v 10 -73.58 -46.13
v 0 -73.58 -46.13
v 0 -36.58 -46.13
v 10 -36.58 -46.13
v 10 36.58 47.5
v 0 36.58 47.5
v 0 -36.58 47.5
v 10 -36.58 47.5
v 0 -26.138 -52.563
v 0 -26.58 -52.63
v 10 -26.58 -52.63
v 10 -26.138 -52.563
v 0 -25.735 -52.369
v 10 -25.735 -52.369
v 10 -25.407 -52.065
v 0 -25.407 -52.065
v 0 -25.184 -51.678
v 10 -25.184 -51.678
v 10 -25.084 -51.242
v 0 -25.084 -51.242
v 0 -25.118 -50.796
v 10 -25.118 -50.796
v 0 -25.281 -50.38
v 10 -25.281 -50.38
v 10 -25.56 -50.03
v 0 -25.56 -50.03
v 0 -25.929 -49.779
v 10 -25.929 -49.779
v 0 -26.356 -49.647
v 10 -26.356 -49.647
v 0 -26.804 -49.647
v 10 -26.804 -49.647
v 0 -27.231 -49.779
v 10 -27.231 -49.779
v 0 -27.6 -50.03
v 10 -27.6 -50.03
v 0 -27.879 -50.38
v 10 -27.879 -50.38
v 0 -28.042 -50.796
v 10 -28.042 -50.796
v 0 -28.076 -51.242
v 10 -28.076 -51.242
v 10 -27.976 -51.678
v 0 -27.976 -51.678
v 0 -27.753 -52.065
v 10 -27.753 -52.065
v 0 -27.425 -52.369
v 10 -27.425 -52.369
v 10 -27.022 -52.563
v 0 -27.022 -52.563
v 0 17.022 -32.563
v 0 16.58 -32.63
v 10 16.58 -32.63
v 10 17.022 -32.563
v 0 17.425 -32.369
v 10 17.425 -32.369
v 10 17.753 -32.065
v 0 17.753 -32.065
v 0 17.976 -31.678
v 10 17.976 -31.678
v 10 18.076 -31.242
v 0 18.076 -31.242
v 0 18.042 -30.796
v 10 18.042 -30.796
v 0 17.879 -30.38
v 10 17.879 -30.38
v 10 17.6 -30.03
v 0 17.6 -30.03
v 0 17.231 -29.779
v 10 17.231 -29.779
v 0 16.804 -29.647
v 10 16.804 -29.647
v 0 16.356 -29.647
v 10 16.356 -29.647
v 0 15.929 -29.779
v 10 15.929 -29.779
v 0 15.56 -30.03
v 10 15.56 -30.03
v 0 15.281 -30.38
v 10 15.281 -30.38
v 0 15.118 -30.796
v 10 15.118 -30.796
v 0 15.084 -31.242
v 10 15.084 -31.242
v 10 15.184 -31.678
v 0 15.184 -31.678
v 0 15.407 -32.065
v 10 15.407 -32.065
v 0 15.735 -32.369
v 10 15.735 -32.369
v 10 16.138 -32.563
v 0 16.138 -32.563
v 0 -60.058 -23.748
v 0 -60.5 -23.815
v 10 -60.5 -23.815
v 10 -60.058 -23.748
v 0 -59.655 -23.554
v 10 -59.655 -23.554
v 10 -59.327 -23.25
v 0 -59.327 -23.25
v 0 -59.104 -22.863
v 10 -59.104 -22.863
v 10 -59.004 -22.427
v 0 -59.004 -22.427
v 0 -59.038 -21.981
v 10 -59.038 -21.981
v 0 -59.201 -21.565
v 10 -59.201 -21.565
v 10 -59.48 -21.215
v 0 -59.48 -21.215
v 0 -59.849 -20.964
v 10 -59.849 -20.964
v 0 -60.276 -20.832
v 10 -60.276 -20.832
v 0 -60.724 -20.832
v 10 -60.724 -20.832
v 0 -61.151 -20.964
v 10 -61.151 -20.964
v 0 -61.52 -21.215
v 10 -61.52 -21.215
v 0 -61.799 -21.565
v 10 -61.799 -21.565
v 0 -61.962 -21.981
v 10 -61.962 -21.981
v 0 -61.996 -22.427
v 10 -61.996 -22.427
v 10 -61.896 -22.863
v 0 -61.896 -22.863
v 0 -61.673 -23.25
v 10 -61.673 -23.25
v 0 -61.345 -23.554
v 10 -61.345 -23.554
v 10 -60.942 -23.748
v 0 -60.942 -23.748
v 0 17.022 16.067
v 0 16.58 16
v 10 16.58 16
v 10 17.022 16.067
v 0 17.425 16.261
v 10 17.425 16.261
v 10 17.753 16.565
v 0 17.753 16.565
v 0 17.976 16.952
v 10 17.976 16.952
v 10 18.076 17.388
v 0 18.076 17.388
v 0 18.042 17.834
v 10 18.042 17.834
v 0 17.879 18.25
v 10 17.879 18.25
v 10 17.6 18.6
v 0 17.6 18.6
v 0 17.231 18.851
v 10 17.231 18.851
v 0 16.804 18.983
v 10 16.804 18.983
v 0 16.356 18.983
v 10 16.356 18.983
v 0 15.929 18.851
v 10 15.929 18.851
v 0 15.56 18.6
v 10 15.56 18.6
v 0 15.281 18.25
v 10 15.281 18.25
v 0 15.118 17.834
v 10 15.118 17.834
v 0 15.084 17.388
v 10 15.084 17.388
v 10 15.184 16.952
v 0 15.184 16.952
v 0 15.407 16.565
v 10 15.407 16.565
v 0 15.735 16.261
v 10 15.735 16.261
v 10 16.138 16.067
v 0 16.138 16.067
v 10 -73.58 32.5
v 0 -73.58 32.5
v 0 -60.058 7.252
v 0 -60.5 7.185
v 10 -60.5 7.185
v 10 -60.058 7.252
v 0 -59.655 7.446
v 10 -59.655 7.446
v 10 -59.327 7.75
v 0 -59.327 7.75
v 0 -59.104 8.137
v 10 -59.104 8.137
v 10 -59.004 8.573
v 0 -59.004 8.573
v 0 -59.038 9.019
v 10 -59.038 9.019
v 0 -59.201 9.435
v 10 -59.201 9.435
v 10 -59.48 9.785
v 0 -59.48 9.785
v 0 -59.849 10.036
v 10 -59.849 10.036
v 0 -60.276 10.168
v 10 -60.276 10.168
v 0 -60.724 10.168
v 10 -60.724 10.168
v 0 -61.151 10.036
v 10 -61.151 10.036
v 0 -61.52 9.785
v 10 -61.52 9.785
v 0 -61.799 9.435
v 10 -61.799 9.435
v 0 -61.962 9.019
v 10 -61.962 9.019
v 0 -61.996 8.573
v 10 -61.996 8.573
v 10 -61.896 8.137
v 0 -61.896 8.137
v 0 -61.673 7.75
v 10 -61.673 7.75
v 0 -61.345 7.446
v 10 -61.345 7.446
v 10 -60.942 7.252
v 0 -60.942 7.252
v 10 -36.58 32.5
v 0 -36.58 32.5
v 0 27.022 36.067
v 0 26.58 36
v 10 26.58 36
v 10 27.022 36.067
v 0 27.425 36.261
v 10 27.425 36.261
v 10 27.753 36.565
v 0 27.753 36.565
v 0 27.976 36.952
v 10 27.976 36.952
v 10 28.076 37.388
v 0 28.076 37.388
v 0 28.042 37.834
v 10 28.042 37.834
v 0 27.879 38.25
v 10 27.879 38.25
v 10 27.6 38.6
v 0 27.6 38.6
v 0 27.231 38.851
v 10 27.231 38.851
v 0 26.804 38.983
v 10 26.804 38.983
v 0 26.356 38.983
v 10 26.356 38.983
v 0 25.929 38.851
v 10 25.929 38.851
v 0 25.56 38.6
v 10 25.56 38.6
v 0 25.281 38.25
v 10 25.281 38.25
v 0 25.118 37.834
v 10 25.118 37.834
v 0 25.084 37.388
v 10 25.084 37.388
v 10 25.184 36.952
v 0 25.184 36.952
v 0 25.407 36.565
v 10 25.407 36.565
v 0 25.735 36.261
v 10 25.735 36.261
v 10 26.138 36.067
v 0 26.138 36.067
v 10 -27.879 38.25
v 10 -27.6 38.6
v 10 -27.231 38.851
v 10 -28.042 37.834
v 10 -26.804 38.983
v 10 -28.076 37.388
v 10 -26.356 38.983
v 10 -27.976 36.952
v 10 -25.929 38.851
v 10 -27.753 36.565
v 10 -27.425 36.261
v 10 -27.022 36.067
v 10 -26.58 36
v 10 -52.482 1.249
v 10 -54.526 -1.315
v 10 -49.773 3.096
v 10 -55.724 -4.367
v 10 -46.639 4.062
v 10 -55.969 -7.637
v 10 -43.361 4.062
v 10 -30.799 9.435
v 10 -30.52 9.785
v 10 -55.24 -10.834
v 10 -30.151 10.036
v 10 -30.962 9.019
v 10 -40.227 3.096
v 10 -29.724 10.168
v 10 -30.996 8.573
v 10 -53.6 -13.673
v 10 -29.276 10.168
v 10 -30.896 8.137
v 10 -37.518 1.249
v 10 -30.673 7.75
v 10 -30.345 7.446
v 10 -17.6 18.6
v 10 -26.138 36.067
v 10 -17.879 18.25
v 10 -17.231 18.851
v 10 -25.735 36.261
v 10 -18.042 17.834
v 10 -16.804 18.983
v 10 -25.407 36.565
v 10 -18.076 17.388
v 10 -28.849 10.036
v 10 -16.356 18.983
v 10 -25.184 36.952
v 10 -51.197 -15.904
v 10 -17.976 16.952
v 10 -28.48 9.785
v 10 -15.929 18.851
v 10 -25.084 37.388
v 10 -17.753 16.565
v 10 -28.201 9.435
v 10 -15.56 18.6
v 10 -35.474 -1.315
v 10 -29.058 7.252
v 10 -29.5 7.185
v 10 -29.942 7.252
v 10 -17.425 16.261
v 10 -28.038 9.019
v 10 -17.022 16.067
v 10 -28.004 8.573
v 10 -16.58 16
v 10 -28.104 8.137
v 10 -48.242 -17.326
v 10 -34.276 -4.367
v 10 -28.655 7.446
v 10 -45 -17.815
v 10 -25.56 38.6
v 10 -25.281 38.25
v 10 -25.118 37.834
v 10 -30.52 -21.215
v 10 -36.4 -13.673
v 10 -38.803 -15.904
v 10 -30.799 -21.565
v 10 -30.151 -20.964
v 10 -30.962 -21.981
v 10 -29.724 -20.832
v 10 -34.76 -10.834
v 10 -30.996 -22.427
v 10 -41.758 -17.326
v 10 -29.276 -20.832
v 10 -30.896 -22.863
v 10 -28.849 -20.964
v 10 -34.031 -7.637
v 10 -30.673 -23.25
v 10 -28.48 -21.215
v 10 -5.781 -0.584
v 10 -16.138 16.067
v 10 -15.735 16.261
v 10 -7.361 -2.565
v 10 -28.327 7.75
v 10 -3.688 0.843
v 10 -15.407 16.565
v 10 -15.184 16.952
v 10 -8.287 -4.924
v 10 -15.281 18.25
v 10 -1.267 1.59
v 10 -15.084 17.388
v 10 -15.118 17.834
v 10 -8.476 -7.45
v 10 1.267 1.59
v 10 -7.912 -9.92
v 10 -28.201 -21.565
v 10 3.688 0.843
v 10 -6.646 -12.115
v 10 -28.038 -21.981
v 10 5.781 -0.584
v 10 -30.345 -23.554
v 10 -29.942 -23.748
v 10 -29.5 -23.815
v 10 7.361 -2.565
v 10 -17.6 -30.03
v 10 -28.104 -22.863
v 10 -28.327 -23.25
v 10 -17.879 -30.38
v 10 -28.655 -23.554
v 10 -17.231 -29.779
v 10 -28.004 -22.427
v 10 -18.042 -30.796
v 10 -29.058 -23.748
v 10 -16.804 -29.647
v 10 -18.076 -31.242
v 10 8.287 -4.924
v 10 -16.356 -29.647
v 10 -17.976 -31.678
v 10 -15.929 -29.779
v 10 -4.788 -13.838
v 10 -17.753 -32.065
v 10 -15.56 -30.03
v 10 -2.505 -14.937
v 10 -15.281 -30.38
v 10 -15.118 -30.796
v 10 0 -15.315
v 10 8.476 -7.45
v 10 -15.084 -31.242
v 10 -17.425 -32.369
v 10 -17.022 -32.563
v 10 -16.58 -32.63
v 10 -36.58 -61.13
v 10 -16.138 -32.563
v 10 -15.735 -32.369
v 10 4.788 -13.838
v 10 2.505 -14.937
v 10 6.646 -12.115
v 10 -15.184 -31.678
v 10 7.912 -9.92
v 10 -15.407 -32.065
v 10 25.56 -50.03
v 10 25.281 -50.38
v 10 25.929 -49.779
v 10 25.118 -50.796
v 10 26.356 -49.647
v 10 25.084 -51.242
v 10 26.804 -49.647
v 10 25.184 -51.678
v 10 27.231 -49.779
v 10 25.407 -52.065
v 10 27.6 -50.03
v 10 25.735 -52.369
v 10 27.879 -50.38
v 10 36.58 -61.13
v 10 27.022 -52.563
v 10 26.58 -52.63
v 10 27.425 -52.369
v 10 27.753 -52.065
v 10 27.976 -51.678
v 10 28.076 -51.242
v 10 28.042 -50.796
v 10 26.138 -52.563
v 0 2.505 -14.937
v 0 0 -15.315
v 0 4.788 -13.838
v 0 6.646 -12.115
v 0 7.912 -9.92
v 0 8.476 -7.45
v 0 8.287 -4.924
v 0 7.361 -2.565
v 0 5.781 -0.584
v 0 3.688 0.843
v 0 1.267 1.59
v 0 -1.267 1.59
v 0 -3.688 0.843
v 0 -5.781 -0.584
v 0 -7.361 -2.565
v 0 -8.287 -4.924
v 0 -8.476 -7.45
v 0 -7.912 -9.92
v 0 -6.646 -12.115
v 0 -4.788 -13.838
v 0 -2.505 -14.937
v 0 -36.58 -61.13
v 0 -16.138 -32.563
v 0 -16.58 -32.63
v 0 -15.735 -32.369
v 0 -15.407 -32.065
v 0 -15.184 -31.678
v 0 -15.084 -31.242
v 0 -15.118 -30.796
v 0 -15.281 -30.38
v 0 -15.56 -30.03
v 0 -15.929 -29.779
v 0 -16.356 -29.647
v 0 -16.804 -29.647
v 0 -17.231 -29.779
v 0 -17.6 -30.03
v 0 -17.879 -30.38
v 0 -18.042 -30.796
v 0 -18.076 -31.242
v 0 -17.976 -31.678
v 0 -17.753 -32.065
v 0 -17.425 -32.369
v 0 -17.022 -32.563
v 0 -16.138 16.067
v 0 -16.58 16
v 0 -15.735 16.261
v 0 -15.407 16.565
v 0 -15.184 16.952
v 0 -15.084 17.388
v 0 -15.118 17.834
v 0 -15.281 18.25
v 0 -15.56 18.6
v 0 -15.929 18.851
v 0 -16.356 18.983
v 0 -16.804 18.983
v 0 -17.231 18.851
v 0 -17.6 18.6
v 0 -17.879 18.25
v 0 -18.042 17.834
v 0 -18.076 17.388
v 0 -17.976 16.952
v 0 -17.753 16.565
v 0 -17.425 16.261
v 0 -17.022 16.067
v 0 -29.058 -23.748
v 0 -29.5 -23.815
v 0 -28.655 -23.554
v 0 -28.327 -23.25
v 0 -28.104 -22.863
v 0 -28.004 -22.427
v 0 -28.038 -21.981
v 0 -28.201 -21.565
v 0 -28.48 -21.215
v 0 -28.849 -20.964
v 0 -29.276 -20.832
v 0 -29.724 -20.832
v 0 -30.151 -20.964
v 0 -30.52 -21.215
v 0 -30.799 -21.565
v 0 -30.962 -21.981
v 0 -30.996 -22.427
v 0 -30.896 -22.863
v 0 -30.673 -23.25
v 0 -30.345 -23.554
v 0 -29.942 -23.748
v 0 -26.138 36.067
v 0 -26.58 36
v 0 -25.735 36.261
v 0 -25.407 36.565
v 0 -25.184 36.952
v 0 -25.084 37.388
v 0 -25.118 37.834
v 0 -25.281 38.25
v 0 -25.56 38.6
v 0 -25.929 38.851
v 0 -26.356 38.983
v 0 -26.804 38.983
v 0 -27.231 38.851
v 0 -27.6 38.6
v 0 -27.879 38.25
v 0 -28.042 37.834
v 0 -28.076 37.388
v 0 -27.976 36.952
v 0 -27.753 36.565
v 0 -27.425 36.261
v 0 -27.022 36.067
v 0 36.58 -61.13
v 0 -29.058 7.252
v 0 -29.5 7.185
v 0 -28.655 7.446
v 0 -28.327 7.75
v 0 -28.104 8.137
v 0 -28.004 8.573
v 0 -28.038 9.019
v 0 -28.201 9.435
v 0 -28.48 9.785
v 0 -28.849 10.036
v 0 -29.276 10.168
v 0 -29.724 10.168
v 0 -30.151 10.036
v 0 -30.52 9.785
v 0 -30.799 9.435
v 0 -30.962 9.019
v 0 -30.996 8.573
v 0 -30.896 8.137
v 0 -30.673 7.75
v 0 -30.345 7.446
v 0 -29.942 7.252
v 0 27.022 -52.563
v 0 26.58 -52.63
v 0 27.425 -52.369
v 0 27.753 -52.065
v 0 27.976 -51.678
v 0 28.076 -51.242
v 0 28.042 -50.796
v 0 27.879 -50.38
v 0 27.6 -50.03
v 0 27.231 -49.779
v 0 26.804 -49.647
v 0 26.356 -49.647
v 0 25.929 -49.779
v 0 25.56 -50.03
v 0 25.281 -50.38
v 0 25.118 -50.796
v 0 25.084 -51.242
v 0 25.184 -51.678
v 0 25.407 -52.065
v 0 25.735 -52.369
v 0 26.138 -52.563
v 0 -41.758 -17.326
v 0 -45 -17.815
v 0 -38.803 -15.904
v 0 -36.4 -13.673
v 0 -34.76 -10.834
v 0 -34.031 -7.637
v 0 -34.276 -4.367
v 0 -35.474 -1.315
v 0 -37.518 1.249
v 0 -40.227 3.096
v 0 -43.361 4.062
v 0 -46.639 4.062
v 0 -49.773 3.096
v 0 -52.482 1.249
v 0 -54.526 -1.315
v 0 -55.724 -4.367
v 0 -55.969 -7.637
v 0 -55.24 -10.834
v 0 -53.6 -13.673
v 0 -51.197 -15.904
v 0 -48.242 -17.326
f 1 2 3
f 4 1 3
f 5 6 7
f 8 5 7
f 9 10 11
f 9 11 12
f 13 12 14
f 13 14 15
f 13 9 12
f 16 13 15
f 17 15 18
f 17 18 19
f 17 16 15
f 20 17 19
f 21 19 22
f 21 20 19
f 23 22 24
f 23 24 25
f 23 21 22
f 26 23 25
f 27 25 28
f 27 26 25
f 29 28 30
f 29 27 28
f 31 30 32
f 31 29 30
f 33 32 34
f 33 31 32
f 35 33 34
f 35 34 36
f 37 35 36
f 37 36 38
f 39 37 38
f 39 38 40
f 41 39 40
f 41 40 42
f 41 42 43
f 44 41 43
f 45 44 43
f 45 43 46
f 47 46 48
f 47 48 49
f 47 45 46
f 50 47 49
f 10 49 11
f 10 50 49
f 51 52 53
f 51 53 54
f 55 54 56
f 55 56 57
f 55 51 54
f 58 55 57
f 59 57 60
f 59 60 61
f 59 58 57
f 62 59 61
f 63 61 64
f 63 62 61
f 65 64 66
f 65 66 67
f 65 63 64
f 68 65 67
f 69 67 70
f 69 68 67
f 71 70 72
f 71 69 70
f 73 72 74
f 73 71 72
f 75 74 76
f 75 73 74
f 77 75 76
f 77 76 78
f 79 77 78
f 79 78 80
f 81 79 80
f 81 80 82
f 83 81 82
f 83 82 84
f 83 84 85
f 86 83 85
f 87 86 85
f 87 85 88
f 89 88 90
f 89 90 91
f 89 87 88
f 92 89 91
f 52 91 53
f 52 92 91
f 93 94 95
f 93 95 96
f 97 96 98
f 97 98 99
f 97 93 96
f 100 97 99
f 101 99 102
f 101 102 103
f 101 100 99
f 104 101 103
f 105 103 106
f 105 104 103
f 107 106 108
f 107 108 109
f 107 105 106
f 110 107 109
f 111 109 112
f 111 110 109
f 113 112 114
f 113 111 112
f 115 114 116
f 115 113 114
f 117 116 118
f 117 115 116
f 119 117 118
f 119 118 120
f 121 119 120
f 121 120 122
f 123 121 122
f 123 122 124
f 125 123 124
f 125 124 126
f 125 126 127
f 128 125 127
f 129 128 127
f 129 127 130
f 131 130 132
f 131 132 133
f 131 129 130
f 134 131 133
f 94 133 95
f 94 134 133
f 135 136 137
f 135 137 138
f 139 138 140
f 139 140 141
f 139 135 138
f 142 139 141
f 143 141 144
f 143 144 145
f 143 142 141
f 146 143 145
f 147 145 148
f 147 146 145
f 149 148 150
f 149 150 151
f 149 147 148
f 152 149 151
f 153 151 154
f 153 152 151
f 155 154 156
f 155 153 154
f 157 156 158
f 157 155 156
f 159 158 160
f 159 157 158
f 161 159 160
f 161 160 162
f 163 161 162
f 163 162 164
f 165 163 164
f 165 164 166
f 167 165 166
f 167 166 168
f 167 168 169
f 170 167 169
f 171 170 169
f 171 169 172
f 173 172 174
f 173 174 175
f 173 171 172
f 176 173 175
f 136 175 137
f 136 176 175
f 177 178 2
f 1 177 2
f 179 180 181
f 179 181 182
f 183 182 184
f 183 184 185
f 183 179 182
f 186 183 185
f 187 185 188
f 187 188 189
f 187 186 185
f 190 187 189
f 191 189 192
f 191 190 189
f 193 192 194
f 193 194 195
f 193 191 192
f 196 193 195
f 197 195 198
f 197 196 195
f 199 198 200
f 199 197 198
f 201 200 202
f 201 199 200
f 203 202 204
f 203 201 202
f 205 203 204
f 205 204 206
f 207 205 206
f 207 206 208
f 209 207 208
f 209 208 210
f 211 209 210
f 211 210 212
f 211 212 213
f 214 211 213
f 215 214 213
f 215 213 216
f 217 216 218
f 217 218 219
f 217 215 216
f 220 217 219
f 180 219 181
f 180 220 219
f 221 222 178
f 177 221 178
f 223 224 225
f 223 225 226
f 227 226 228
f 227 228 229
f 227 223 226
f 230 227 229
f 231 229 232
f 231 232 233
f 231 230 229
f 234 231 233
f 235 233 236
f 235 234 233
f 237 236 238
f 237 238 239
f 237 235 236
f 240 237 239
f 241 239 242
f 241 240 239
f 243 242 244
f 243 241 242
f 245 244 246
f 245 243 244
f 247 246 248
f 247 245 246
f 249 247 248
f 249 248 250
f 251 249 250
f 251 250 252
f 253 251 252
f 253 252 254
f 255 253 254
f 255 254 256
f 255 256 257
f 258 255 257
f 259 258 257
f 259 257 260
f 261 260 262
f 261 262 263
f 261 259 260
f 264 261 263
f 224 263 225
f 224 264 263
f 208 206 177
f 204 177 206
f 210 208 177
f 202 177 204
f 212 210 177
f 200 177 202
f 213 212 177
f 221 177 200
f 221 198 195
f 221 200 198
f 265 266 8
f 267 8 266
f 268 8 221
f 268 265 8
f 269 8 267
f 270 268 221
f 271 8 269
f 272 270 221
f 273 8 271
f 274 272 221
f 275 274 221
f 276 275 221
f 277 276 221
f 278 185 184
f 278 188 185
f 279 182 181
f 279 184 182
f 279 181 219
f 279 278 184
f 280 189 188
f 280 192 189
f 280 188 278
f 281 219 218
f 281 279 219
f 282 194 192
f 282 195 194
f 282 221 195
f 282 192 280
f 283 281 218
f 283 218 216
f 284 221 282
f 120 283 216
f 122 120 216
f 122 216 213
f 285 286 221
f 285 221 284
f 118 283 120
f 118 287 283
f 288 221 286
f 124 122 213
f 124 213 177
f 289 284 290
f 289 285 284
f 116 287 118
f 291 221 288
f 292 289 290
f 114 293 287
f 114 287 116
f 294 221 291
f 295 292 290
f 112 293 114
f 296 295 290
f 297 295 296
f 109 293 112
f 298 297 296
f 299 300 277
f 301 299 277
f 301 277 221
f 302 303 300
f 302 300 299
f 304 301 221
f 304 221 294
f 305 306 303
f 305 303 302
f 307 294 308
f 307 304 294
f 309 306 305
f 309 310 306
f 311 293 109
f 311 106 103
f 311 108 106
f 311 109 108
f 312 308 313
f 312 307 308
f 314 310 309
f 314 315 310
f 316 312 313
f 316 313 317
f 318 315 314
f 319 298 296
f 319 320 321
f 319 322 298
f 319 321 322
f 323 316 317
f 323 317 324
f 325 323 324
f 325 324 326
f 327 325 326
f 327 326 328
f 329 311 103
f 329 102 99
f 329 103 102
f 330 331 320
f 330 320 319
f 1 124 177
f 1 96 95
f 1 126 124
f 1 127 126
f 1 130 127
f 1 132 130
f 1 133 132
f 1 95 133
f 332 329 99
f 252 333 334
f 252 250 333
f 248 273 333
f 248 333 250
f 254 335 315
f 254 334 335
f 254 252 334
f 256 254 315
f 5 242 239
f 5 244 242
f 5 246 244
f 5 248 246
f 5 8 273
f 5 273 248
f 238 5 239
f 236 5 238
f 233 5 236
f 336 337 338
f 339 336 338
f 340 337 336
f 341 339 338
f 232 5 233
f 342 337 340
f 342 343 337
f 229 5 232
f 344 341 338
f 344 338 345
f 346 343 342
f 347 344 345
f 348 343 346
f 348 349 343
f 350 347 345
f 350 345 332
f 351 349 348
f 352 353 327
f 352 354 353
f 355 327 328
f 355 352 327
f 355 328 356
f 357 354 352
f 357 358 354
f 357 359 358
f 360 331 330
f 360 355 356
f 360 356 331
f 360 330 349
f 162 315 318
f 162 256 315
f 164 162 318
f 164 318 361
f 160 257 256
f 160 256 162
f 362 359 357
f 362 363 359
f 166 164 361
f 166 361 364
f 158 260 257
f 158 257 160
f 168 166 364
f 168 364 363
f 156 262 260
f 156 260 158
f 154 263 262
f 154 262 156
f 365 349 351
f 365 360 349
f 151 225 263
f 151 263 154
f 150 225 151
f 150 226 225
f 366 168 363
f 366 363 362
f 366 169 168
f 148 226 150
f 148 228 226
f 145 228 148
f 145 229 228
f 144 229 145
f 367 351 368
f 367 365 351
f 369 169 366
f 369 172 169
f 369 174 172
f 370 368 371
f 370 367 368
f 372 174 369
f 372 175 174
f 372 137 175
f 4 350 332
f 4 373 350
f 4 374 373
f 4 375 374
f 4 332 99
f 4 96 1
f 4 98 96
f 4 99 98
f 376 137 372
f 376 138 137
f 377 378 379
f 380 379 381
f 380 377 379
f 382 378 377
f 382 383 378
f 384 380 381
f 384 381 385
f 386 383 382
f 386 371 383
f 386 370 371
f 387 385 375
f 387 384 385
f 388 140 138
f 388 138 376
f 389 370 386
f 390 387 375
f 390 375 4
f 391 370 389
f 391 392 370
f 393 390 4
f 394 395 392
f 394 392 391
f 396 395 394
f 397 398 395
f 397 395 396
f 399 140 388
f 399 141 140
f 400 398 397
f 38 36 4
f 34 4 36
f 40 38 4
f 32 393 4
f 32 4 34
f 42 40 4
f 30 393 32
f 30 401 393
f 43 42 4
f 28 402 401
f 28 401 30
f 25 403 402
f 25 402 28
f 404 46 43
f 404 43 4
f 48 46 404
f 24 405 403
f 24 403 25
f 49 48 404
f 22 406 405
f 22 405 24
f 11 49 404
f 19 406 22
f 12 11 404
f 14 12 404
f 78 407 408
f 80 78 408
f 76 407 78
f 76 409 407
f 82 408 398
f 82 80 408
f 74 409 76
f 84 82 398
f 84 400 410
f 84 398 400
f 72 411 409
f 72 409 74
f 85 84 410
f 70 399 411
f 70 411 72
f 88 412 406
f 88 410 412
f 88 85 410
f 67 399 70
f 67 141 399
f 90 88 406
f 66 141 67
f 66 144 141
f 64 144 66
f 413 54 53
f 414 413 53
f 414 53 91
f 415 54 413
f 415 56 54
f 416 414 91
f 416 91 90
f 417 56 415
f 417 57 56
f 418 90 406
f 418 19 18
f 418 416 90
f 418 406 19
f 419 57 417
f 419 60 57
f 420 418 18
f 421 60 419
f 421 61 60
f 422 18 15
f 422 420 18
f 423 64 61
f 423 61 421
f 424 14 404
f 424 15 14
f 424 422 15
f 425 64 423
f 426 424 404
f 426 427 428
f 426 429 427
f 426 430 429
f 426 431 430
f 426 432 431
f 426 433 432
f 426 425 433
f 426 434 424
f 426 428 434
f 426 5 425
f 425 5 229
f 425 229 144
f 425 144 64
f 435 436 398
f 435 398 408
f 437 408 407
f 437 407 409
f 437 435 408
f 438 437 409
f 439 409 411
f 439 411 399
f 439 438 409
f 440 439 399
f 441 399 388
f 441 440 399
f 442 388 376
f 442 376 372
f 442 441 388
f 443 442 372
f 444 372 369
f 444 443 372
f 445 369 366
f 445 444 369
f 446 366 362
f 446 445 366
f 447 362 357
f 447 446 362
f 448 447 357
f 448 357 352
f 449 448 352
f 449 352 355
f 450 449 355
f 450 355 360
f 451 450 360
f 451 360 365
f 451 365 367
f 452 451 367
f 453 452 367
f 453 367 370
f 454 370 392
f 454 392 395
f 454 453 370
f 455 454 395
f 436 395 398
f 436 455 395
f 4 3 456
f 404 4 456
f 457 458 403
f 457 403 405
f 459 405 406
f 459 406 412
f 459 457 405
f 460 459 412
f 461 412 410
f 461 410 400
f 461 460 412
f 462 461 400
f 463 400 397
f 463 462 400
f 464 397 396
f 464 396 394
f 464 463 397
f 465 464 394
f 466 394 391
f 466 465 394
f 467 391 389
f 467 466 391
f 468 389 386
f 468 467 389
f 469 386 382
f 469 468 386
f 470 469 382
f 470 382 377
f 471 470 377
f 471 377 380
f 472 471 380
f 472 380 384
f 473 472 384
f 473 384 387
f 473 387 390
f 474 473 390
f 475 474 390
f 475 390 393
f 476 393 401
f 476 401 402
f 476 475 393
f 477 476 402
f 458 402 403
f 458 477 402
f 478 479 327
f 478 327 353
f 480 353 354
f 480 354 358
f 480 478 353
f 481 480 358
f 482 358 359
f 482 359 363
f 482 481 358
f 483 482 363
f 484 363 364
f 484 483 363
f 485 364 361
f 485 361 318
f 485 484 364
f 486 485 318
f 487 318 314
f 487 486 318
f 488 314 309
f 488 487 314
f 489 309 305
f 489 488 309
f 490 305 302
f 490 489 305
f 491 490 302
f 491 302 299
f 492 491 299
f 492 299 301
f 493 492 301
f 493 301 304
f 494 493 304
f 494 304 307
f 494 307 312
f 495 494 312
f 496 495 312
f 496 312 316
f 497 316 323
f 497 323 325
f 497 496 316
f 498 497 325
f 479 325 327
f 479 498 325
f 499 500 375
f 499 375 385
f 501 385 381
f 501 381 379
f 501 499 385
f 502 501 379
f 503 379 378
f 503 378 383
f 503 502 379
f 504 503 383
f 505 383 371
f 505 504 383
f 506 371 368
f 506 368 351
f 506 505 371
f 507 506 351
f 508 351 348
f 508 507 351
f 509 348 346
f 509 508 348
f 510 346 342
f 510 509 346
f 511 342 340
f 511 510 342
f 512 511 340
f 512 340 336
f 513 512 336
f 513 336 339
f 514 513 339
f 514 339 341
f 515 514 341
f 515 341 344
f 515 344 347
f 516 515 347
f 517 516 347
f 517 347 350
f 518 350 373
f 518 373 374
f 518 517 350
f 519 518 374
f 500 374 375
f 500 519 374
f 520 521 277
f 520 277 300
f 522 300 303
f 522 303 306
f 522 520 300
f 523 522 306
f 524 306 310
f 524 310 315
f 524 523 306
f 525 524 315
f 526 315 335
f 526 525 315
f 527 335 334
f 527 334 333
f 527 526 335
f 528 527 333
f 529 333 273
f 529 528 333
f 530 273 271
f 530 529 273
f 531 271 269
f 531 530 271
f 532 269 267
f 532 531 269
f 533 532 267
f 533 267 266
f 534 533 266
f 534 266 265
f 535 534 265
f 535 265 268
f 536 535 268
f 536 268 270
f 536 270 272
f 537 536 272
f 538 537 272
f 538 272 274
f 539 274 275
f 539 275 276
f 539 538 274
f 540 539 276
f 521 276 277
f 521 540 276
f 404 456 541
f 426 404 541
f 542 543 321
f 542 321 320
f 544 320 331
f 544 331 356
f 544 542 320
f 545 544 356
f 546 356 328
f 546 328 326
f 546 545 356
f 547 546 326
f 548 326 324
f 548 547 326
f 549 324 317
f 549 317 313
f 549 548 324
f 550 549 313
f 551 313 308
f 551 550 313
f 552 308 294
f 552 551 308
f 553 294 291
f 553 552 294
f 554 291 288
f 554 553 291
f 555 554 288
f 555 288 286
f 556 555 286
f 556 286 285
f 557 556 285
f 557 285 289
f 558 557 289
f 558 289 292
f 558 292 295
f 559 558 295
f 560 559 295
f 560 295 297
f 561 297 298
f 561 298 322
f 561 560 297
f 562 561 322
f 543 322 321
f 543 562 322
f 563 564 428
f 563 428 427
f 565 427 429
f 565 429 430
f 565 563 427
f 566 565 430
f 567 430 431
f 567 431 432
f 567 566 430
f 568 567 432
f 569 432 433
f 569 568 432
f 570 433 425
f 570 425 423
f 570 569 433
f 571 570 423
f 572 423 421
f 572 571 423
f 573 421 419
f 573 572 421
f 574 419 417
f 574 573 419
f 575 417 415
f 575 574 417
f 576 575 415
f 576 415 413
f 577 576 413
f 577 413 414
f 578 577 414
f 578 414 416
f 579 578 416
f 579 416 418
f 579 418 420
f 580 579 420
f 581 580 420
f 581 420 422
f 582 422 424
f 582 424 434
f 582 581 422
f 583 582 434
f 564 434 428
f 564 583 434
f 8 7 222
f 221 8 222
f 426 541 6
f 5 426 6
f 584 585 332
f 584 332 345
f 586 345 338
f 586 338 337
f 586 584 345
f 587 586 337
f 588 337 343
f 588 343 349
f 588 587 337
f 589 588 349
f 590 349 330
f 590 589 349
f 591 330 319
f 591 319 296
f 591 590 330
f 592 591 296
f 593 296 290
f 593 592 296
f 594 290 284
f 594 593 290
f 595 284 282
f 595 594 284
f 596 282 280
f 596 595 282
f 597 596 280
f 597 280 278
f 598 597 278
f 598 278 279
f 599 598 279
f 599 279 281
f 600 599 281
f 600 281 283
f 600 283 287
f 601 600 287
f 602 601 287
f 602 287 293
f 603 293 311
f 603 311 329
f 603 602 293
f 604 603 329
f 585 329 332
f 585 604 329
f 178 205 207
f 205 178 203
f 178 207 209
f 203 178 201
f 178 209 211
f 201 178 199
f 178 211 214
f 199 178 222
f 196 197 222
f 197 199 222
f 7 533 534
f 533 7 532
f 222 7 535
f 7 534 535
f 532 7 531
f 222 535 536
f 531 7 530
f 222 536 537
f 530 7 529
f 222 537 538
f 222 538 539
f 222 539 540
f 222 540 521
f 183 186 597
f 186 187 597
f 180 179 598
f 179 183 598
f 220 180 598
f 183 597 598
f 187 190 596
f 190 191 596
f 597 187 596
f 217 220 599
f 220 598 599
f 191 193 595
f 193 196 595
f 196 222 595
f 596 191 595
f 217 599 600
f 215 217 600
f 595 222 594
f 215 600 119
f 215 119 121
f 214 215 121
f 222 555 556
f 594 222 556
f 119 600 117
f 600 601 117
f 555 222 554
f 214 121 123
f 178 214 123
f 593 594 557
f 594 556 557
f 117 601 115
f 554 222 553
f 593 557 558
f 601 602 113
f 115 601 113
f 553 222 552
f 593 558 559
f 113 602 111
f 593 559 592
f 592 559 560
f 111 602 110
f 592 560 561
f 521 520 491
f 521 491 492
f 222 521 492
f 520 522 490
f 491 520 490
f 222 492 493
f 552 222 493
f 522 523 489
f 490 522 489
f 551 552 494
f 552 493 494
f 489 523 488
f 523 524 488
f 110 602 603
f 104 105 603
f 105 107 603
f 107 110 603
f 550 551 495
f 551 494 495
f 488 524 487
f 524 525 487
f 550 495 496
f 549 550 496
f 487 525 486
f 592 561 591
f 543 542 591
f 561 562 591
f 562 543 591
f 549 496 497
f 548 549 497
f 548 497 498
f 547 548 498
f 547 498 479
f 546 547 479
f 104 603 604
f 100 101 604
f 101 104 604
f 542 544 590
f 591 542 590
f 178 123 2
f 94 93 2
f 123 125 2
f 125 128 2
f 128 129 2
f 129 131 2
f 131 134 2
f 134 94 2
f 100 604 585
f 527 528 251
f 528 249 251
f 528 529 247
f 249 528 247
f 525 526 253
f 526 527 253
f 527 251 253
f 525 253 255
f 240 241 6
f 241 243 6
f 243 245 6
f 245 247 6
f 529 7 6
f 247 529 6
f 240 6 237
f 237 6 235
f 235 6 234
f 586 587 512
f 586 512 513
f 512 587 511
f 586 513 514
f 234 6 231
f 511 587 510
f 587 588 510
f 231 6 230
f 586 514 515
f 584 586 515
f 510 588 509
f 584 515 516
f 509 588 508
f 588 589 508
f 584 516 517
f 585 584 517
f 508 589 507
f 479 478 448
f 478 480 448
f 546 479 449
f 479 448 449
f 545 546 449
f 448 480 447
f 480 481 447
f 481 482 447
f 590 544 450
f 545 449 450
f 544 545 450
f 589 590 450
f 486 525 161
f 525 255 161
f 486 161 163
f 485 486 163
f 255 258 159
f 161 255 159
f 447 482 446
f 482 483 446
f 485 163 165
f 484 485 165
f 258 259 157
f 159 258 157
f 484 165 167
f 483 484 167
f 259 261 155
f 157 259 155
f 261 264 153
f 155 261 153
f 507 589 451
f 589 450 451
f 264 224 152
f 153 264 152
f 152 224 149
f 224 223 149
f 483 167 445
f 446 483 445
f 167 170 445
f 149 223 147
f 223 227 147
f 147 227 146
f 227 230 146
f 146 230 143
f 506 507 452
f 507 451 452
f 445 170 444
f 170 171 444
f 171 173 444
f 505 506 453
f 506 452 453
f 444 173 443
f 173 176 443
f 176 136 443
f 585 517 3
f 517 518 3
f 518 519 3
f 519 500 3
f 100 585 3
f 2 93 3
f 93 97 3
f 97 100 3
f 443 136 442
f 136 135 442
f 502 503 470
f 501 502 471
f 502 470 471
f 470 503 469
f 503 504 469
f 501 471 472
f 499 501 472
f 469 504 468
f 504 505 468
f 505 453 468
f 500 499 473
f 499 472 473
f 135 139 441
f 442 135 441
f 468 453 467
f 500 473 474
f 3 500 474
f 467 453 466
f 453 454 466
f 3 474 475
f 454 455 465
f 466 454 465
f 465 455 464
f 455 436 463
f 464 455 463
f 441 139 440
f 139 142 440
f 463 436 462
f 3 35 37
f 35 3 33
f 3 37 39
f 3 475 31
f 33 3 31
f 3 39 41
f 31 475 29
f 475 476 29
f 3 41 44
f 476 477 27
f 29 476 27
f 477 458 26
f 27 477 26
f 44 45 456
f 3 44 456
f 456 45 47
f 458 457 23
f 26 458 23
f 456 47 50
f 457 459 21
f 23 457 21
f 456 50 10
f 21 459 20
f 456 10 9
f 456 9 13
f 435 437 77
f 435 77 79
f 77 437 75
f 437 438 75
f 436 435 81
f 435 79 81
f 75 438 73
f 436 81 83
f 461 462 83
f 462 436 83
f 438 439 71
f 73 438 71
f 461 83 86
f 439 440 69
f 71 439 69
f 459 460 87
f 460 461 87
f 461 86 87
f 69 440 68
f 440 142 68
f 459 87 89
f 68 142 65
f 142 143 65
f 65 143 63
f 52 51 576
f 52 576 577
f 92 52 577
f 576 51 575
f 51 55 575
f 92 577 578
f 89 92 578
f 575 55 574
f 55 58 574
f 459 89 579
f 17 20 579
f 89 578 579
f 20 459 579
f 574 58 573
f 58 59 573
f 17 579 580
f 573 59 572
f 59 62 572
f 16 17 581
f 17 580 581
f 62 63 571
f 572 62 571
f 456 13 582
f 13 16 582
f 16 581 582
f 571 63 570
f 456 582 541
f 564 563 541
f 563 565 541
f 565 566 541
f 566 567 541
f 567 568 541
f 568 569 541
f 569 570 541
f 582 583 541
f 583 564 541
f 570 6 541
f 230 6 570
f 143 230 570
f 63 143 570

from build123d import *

# Parameters (mm, degrees)
SKETCH_1_R      = 1.5
SKETCH_1_R_2    = 8.5
SKETCH_1_R_3    = 11
EXTRUDE_1_DEPTH = 10


with BuildPart() as part:
    # 草图1 → 凸台-拉伸1 (new body)
    with BuildSketch(Plane(origin=(0, 0, 0), x_dir=(0, 0, -1), z_dir=(1, 0, 0))):
        Polygon((-27.5, 36.58), (-47.5, 36.58), (-47.5, -36.58), (-32.5, -36.58), (-32.5, -73.58), (46.13, -73.58), (46.13, -36.58), (61.13, -36.58), (61.13, 36.58), align=None)
        with Locations((-8.685, -29.5)):
            Circle(SKETCH_1_R, mode=Mode.SUBTRACT)
        with Locations((-37.5, 26.58)):
            Circle(SKETCH_1_R, mode=Mode.SUBTRACT)
        with Locations((-17.5, 16.58)):
            Circle(SKETCH_1_R, mode=Mode.SUBTRACT)
        with Locations((31.13, 16.58)):
            Circle(SKETCH_1_R, mode=Mode.SUBTRACT)
        with Locations((51.13, 26.58)):
            Circle(SKETCH_1_R, mode=Mode.SUBTRACT)
        with Locations((-37.5, -26.58)):
            Circle(SKETCH_1_R, mode=Mode.SUBTRACT)
        with Locations((-17.5, -16.58)):
            Circle(SKETCH_1_R, mode=Mode.SUBTRACT)
        with Locations((31.13, -16.58)):
            Circle(SKETCH_1_R, mode=Mode.SUBTRACT)
        with Locations((51.13, -26.58)):
            Circle(SKETCH_1_R, mode=Mode.SUBTRACT)
        with Locations((22.315, -29.5)):
            Circle(SKETCH_1_R, mode=Mode.SUBTRACT)
        with Locations((-8.685, -60.5)):
            Circle(SKETCH_1_R, mode=Mode.SUBTRACT)
        with Locations((22.315, -60.5)):
            Circle(SKETCH_1_R, mode=Mode.SUBTRACT)
        with Locations((6.815, 0)):
            Circle(SKETCH_1_R_2, mode=Mode.SUBTRACT)
        with Locations((6.815, -45)):
            Circle(SKETCH_1_R_3, mode=Mode.SUBTRACT)
    extrude(amount=EXTRUDE_1_DEPTH)


solid = part.part
